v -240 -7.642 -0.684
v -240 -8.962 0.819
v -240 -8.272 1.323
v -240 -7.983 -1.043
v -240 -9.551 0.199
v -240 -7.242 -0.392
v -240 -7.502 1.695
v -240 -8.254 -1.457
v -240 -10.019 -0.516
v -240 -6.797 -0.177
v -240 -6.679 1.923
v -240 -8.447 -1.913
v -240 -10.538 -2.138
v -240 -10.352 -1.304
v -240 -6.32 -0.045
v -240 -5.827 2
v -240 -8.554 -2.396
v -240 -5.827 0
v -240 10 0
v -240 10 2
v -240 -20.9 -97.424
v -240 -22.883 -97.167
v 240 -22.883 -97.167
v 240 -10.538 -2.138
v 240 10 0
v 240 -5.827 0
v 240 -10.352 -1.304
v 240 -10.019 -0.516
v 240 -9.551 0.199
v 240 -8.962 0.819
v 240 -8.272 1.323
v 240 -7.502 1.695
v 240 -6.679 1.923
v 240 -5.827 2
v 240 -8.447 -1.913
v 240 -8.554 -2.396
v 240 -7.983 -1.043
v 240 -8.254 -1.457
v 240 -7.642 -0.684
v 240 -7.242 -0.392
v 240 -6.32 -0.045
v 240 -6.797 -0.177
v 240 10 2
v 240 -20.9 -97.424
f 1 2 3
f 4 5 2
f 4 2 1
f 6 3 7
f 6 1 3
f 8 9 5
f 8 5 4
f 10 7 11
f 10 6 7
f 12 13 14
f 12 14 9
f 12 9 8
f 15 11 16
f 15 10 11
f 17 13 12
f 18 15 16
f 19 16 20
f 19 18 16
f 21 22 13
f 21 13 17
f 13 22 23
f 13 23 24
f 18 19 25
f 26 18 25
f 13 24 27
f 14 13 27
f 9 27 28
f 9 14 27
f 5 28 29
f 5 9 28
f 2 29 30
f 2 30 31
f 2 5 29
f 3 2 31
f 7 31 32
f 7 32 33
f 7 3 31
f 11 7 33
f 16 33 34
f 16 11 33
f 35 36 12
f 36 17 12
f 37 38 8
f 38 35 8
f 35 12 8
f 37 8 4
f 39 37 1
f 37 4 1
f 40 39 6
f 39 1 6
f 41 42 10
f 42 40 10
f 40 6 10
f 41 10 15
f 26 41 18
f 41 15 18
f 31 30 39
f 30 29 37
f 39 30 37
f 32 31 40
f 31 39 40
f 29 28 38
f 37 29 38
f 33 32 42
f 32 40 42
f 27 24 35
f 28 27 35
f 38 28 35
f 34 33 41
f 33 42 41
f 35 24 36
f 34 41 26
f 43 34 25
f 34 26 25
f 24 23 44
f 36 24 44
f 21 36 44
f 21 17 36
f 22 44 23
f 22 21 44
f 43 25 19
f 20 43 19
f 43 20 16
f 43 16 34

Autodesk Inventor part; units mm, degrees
ref_plane "YZ Plane" through (0, 0, 0) normal (1, 0, 0) x (0, 1, 0)
ref_plane "XZ Plane" through (0, 0, 0) normal (0, 1, 0) x (-1, 0, 0)
ref_plane "XY Plane" through (0, 0, 0) normal (0, 0, 1) x (1, 0, 0)
sketch "Sketch7" plane through (0, 0, 0) normal (0, 0, 1) x (1, 0, 0)
  line L0 (240, 10) -> (-240, 10)
  line L1 (-240, 10) -> (-240, -10)
  line L2 (-240, -10) -> (240, -10)
  line L3 (240, -10) -> (240, 10)
  line L4 (240, 10) -> (-240, -10) construction
  line L5 (-240, 10) -> (240, -10) construction
  point P0 (0, 0)
  dimension "d52" = 480
  dimension "d53" = 20
extrude "Plate6" add sketch "Sketch7" along normal blind 2
sketch "Sketch8" plane through (-240, -8.0167, 1.7423) normal (0, -0.9916667, 0.1288302) x (1, 0, 0)
  line L0 (480, 0) -> (0, 0)
  line L1 (0, 0) -> (0, -100)
  line L2 (0, -100) -> (480, -100)
  line L3 (480, -100) -> (480, 0)
edge flange "Flange5" height 100 angle 82.598 thickness 2 bend radius 2.75 thickness toward (0, -0.9916667, 0.1288302) relief round relief width 2 relief depth 1 edges at (0, -10, 0) wall of the first edge with corners at (240, -8.0167, 1.7423) (-240, -8.0167, 1.7423) (-240, -20.8997, -97.4243) (240, -20.8997, -97.4243)
bend "Bend5"
corner "Corner5"
equation "\"d54\" = Thickness"
equation "\"d55\" = BendReliefWidth"
equation "\"d56\" = BendReliefDepth"
equation "\"d57\" = MinimumRemnant"
equation "\"d58\" = TransitionRadius"
equation "\"d61\" = BendRadius"
equation "\"d62\" = CornerReliefSize"
equation "\"d63\" = GapSize"
equation "\"d64\" = JacobiRadiusSize"
equation "\"BendReliefWidth\" = Thickness"
equation "\"BendReliefDepth\" = 0.5 * Thickness"
equation "\"CornerReliefSize\" = 4 * Thickness"
equation "\"MinimumRemnant\" = 2 * Thickness"
equation "\"TransitionRadius\" = BendRadius"
equation "\"JacobiRadiusSize\" = BendRadius"
equation "\"GapSize\" = Thickness"
equation "\"Thickness\" = 2"
equation "\"BendRadius\" = 2.75"
properties part number "TRM 017 sheet in" material "AISI 304"
